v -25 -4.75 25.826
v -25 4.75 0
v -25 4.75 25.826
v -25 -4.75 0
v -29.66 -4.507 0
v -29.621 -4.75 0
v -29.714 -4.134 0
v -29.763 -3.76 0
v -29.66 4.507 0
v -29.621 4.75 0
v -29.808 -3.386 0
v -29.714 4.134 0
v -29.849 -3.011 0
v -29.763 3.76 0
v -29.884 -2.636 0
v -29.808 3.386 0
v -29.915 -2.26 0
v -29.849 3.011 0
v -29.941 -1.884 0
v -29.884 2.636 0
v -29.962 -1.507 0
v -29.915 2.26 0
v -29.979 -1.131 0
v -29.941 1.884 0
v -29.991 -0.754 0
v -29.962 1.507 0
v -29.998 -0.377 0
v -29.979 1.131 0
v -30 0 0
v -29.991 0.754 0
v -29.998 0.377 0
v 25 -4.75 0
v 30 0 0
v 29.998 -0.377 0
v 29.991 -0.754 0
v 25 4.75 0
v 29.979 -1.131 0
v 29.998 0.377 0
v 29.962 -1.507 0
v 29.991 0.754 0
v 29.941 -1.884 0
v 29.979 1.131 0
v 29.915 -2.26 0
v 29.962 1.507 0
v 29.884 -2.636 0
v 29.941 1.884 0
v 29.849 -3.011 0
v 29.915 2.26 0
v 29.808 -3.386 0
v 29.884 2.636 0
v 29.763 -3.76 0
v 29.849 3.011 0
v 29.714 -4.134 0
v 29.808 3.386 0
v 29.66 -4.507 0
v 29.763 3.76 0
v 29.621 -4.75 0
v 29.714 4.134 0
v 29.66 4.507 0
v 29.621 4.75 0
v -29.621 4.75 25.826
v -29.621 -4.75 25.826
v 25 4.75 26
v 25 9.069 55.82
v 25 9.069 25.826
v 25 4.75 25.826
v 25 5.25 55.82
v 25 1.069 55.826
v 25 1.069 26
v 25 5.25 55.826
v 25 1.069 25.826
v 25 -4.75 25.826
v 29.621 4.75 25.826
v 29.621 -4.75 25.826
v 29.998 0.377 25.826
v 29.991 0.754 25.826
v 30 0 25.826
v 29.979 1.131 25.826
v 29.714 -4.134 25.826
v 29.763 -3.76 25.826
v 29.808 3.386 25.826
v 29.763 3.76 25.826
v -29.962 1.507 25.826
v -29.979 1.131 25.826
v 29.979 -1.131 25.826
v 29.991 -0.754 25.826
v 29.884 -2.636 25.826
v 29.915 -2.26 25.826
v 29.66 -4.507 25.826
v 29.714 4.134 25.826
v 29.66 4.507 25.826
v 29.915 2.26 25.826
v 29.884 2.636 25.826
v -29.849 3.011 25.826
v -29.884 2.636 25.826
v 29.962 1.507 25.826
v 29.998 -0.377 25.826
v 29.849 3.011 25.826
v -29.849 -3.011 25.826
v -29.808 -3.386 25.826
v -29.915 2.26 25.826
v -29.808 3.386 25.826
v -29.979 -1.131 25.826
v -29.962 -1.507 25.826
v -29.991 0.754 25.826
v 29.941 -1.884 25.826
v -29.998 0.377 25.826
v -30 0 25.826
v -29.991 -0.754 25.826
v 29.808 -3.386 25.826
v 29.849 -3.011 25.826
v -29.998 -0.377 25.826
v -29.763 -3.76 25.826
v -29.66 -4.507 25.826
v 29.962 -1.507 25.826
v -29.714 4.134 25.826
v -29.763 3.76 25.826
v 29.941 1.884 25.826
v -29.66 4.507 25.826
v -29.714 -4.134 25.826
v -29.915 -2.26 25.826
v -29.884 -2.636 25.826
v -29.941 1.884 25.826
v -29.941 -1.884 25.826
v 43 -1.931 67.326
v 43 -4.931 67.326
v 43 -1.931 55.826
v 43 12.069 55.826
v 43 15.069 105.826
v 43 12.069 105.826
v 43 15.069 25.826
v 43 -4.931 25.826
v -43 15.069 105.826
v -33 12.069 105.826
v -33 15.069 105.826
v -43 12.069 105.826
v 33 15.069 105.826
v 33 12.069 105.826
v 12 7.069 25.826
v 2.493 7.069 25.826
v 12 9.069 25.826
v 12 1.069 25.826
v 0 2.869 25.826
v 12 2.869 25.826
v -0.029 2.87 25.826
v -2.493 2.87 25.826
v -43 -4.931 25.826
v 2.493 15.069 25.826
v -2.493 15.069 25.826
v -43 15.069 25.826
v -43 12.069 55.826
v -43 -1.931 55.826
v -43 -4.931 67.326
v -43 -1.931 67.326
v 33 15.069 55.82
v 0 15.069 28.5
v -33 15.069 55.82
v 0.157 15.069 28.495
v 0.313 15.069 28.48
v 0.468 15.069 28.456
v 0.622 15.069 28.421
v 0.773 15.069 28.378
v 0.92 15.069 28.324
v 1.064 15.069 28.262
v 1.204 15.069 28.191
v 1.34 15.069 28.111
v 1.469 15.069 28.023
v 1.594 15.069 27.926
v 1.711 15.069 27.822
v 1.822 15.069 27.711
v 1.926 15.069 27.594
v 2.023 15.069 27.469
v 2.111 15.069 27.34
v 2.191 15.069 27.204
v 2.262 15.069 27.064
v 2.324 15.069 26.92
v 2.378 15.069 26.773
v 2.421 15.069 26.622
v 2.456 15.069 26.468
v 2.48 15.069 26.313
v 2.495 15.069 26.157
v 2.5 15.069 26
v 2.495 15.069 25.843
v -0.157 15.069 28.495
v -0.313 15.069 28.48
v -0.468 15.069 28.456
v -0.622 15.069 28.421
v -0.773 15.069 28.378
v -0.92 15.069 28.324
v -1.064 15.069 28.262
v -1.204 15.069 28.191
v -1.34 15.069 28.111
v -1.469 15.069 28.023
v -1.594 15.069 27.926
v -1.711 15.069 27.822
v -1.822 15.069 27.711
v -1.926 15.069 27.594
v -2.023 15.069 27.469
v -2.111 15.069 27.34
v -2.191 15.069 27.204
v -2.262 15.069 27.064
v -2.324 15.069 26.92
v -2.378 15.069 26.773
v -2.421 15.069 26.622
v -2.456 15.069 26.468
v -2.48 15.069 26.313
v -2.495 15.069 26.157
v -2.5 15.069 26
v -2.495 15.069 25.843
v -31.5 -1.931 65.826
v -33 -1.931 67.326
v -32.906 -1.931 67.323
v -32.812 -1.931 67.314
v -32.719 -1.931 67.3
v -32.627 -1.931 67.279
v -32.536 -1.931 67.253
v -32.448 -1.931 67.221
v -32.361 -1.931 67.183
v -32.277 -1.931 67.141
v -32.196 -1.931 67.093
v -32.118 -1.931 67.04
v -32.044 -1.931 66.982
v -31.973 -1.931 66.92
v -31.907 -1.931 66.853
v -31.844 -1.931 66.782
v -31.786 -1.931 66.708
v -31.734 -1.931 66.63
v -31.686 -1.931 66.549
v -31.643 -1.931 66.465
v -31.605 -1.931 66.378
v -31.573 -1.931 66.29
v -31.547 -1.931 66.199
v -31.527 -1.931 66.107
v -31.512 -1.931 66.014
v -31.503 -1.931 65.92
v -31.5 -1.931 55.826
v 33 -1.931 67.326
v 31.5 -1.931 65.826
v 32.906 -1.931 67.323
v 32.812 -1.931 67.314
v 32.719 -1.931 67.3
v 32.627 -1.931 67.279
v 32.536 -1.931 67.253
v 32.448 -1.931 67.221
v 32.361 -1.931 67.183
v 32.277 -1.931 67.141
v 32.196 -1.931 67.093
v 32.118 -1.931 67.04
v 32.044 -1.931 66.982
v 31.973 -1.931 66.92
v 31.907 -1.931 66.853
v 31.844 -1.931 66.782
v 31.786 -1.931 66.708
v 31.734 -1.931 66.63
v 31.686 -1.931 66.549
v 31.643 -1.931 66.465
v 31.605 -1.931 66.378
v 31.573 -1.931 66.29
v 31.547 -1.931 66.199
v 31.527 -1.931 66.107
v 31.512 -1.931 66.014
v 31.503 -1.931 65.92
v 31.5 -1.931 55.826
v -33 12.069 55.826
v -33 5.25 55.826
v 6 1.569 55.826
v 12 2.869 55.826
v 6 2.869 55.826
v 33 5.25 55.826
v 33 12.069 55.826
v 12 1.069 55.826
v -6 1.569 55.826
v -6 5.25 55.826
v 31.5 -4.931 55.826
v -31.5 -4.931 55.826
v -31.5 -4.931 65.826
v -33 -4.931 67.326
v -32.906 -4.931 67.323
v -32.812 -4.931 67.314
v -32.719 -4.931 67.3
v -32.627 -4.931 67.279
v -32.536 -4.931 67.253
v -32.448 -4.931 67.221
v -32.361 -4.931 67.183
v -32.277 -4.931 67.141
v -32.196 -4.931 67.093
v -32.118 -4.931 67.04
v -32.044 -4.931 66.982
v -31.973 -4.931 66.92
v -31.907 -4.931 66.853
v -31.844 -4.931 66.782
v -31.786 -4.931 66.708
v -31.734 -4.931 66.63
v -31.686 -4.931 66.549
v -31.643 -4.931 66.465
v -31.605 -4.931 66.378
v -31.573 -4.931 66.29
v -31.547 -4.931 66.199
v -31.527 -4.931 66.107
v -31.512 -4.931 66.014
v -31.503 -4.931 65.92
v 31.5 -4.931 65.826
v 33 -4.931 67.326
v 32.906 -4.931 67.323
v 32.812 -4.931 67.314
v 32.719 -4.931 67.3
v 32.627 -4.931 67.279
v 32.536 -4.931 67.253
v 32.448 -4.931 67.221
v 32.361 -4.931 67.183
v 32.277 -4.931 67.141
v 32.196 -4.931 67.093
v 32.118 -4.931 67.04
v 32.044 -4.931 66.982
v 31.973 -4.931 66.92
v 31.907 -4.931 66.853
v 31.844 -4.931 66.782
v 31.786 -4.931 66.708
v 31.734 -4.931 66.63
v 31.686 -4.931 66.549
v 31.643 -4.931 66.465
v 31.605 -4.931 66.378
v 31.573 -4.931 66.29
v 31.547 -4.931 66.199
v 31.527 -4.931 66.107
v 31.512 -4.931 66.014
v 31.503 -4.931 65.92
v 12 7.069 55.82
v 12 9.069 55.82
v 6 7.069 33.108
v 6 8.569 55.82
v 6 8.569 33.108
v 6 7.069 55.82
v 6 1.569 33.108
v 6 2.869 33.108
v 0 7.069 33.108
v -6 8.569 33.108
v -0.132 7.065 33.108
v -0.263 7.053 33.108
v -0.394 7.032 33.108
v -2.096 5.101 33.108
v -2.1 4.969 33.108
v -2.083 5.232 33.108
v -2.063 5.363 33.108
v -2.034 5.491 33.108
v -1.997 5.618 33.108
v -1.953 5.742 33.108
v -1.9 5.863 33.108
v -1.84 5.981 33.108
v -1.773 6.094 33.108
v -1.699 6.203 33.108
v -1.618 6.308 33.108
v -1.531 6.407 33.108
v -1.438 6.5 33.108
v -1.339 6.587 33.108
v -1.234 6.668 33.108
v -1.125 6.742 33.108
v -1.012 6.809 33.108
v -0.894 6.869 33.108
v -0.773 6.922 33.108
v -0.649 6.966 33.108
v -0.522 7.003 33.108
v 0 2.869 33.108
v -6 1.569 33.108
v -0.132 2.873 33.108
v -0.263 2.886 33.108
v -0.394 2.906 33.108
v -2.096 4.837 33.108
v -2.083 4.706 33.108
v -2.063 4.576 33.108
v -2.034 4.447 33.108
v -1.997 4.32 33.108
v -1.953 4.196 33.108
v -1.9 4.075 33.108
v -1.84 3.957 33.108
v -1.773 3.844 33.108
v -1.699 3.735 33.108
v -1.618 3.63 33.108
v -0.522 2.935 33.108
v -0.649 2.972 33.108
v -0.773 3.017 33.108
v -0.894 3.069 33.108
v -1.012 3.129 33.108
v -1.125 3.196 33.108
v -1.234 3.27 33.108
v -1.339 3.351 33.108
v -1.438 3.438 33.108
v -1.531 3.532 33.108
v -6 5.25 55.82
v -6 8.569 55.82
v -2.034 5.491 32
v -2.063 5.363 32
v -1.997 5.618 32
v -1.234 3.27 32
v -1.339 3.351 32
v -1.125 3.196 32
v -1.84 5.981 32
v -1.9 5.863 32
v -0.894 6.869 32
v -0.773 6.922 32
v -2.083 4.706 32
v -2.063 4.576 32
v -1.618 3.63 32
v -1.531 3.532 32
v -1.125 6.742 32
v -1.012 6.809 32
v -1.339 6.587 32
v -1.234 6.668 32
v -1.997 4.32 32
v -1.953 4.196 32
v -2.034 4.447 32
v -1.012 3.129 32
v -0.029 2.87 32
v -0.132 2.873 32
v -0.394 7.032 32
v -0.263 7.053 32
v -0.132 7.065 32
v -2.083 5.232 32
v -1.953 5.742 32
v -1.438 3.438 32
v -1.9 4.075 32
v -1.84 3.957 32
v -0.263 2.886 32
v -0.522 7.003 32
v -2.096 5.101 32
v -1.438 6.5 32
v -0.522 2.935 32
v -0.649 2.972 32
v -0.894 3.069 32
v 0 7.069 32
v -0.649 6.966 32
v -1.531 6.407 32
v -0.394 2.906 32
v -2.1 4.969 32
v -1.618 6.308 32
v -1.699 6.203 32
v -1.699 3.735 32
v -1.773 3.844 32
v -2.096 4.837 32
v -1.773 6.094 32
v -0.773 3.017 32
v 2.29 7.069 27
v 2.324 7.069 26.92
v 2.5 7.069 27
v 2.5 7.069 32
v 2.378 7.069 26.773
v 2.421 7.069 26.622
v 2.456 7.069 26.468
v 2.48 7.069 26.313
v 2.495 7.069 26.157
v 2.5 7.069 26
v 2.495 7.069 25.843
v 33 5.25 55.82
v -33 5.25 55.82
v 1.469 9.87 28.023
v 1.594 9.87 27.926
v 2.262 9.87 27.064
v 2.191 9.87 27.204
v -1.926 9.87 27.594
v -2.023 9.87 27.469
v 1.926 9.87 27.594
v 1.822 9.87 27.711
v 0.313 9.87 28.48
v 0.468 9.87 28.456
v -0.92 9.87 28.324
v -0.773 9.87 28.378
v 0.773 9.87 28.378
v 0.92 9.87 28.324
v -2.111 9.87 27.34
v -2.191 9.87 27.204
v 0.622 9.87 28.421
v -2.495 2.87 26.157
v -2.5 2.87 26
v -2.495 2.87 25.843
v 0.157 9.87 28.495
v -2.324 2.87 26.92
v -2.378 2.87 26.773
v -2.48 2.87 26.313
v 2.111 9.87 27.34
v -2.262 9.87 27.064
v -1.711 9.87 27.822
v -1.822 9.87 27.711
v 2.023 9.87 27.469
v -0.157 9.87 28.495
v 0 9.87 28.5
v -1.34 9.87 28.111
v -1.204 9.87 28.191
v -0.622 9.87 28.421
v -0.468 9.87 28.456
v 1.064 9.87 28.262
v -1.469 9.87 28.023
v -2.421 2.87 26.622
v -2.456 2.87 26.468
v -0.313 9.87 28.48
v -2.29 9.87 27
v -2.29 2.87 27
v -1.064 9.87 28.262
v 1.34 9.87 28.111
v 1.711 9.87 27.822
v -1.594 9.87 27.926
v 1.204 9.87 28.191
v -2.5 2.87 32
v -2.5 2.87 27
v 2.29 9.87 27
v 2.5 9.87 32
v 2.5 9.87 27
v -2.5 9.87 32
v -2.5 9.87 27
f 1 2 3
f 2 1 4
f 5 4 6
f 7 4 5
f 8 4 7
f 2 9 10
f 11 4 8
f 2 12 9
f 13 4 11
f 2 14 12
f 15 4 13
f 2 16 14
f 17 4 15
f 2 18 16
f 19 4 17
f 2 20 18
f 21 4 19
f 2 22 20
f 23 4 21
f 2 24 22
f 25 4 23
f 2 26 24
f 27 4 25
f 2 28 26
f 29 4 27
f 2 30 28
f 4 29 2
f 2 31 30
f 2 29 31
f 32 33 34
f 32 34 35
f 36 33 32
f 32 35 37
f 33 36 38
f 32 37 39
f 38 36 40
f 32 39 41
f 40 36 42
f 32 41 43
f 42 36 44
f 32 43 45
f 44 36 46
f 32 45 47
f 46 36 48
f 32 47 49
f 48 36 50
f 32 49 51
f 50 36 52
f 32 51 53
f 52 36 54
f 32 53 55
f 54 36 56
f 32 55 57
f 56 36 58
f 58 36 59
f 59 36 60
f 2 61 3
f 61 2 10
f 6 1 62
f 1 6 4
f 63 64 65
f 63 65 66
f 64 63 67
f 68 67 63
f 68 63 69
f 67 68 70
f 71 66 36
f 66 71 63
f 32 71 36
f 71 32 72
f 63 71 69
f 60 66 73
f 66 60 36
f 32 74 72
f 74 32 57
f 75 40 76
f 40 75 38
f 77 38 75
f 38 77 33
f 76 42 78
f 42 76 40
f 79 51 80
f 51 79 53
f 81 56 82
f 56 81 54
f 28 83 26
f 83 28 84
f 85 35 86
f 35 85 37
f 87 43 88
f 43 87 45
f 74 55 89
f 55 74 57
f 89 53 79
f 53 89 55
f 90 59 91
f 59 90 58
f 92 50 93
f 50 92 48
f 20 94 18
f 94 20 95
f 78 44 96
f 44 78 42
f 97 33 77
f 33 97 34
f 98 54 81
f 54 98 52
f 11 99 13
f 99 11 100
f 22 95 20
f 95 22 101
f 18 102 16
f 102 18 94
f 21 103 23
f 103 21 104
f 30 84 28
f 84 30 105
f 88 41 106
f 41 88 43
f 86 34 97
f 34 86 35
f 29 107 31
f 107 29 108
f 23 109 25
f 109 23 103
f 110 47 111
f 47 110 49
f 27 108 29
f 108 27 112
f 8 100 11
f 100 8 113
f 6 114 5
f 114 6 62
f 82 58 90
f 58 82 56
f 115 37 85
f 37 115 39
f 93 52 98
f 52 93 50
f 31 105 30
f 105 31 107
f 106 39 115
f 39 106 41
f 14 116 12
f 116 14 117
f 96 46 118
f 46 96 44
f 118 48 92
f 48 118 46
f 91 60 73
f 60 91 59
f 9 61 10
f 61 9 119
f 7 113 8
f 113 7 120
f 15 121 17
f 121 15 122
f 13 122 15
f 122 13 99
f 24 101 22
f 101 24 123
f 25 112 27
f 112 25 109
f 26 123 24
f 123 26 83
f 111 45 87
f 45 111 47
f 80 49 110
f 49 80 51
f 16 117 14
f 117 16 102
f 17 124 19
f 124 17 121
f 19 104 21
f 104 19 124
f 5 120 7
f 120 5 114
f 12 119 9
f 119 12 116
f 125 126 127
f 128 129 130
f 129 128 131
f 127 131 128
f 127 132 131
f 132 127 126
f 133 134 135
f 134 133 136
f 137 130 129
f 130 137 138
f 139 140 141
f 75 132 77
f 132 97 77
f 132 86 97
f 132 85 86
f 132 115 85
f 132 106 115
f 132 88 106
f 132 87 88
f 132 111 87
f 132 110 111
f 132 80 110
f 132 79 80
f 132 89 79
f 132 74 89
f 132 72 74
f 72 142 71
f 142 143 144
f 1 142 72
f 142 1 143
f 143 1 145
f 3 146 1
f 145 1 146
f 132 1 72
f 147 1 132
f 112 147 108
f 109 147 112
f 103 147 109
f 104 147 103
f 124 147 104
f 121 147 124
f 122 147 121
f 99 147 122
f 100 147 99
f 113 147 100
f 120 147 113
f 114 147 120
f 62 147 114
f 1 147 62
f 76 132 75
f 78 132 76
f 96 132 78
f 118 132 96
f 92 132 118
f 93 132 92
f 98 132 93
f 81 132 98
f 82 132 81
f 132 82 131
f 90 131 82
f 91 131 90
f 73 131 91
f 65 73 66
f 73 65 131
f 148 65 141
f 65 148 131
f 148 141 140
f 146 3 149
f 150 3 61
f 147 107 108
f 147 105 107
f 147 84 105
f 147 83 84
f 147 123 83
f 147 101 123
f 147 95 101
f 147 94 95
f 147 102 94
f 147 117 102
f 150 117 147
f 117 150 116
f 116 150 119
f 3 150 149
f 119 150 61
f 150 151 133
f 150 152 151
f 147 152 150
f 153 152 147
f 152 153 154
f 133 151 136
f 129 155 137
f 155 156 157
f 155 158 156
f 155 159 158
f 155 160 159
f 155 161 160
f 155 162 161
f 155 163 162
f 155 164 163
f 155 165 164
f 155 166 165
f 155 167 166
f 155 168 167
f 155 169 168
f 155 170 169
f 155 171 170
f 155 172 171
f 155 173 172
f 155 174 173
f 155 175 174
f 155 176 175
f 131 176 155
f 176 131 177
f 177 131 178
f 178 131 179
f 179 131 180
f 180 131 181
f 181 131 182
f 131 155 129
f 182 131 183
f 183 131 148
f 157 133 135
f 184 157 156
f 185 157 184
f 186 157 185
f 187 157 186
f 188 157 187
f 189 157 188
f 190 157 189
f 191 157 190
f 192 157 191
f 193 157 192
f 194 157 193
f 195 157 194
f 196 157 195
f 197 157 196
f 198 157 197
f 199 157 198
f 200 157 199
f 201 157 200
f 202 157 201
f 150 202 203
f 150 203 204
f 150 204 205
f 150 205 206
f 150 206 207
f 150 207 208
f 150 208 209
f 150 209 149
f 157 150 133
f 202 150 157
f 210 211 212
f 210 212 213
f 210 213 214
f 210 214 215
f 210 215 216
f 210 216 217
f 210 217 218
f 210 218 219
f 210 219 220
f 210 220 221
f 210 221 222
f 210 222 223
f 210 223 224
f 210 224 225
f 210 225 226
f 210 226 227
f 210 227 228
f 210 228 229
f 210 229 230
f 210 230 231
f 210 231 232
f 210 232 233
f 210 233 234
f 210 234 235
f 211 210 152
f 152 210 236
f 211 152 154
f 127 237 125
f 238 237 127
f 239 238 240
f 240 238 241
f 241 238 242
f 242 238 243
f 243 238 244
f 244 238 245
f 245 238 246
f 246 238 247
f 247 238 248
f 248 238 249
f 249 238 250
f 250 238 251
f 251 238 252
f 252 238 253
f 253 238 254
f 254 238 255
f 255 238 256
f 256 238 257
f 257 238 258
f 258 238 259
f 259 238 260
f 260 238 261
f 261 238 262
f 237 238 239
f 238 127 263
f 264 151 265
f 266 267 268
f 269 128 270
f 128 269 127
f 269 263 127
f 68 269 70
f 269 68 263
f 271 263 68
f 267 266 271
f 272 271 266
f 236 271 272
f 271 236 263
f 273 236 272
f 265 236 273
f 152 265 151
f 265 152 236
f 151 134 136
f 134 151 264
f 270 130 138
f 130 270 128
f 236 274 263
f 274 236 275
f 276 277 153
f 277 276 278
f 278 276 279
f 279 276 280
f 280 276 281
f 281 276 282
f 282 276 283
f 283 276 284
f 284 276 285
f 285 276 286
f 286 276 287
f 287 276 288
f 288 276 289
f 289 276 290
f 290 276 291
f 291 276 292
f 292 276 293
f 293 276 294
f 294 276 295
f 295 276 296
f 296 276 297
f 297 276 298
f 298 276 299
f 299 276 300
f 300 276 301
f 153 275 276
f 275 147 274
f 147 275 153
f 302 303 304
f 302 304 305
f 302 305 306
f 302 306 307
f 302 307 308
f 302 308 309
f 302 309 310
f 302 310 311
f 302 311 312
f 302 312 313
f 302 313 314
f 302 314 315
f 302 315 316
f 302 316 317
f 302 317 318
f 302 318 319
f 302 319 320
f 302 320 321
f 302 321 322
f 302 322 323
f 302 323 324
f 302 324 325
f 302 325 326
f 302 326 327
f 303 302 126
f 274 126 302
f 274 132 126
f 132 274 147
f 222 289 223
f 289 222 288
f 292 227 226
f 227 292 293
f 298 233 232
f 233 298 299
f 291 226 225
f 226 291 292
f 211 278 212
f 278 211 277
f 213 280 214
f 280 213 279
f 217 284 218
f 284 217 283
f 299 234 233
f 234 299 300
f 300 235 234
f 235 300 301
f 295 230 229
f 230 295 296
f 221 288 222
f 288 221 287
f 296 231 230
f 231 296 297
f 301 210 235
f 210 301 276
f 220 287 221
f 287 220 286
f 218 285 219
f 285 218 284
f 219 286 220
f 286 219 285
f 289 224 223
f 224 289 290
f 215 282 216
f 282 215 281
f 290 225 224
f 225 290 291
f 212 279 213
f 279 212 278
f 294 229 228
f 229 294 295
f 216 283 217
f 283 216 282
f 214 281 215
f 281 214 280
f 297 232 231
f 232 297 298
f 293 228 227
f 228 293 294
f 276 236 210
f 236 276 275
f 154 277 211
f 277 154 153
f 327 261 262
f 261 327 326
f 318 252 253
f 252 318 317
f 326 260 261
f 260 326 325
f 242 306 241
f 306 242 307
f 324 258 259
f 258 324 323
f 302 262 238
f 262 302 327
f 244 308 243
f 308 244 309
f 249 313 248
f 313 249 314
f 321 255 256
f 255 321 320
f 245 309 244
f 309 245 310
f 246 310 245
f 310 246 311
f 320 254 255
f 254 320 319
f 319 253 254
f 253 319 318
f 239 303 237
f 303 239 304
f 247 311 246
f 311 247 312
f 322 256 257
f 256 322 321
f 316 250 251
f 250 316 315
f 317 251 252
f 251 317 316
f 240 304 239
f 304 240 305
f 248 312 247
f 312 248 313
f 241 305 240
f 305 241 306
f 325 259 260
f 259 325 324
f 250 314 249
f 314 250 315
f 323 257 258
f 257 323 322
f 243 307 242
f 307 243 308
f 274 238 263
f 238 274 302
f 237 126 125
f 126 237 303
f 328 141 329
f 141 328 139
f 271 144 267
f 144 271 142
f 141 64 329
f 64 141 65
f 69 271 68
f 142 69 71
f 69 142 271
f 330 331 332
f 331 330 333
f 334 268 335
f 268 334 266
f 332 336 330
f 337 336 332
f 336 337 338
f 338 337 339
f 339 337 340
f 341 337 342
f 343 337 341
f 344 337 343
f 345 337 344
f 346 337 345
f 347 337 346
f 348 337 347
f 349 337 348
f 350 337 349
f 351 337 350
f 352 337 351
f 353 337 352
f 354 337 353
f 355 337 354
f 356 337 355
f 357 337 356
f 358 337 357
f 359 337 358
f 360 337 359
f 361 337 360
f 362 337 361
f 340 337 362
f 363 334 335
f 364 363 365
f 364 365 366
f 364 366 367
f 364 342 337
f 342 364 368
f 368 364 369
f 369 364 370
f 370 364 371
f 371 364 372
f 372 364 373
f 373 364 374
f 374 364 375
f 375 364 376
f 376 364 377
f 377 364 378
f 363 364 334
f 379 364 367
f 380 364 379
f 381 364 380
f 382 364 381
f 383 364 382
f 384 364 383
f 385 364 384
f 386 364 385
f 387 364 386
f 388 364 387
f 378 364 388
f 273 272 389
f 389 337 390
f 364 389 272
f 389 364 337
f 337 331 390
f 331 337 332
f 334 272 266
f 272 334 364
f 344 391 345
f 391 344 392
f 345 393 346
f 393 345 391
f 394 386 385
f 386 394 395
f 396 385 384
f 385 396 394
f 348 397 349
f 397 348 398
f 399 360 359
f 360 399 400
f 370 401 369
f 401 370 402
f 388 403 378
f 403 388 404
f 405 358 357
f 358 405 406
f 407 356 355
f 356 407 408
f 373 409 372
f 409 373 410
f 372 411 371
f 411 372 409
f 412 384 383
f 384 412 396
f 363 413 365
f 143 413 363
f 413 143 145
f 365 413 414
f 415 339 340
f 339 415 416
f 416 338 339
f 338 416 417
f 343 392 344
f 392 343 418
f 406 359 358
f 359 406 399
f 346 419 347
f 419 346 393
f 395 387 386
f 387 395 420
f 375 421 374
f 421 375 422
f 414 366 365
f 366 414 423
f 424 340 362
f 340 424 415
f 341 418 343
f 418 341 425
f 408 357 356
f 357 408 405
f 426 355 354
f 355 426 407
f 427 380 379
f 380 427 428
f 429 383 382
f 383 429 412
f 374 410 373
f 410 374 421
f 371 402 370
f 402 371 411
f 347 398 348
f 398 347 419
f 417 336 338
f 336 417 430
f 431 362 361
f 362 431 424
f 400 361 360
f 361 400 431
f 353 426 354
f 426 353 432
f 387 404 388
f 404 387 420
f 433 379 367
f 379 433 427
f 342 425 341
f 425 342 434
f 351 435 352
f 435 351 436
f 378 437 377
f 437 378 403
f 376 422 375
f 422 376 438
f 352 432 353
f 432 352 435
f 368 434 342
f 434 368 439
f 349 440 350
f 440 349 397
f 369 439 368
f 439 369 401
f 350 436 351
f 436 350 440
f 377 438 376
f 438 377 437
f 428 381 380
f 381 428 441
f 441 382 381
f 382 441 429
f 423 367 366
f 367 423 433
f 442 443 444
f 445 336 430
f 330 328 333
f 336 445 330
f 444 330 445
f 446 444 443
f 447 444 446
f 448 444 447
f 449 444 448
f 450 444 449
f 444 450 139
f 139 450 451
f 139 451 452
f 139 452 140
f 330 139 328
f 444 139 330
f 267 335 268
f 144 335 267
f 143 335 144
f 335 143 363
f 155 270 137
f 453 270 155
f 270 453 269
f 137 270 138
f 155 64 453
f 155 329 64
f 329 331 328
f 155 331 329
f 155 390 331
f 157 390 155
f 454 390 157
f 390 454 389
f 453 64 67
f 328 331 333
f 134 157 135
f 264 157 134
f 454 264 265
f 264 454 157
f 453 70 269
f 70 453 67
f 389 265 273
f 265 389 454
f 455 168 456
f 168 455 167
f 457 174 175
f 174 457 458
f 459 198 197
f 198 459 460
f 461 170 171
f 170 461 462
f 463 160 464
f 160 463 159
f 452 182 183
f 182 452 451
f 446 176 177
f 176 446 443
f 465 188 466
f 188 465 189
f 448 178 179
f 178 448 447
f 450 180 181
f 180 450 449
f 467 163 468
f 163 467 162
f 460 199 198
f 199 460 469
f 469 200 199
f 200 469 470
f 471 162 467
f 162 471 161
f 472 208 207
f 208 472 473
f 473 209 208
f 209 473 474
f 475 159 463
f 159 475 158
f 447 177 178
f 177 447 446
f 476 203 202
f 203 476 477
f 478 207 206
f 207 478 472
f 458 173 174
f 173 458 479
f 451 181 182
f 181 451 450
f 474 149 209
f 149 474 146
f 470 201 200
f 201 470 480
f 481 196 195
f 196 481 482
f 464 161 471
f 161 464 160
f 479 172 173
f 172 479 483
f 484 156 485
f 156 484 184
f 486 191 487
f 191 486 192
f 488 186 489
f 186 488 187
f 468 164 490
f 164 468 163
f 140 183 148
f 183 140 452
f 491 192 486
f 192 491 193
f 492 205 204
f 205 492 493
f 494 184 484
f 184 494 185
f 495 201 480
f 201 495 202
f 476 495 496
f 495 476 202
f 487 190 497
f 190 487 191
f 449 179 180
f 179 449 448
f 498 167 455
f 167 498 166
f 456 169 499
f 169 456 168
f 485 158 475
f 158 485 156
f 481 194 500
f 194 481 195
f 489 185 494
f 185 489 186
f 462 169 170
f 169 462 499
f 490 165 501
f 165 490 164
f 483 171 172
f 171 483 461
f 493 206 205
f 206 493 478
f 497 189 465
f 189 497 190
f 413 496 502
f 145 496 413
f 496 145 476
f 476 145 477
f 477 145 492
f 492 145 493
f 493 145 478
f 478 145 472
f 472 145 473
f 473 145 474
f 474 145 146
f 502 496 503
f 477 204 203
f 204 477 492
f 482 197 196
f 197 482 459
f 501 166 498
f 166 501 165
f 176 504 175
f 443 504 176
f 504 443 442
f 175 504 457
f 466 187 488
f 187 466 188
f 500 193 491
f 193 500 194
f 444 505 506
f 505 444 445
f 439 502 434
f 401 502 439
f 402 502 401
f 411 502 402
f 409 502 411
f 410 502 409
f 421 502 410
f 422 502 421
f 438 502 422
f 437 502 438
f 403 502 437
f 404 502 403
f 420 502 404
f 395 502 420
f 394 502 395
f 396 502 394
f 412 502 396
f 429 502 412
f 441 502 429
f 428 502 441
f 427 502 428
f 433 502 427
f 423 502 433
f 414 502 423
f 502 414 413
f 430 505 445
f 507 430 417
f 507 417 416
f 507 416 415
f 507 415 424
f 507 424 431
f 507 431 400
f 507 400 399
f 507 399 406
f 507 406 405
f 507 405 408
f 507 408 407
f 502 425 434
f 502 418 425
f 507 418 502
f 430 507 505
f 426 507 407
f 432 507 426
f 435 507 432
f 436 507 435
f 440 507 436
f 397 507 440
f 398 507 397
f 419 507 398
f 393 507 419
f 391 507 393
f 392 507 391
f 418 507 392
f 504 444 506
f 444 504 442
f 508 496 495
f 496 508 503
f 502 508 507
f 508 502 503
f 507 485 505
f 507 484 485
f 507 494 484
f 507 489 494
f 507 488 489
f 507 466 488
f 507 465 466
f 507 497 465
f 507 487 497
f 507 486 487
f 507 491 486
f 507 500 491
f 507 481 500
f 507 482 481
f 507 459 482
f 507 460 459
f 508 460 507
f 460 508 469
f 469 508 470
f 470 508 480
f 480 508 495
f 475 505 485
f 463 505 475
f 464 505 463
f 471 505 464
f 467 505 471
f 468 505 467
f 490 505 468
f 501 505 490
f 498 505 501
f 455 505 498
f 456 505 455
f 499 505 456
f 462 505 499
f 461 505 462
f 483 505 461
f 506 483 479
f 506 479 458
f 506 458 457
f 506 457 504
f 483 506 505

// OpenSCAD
// file: params.scad
d_cup_holder = 60;
h_cup_holder = 25;

x_support = 5;
y_support = 10;

x_usb = 12;
y_usb = 7;
z_usb = 20;
// main file
include <params.scad>;

union()
{
    intersection()
    {
        union()
        {
            translate([d_cup_holder / -2, (y_support - 0.5) / -2, 0])
            {
                cube([x_support, y_support - 0.5, h_cup_holder + 1]);
            }

            translate([d_cup_holder / 2 - x_support, (y_support - 0.5) / -2, 0])
            {
                cube([x_support, y_support - 0.5, h_cup_holder + 1]);
            }
        }

        cylinder(h=h_cup_holder + 1, d=d_cup_holder, $fn=500);

    }

    // From https://github.com/mioux/pixel_6-stand
    // I don't want to rewrite all :D
    translate([-43, (y_support - 0.5) / -2, 20])
    {
        difference()
        {
            union()
            {
                translate([0, 3 * cos(20), 6.2 * cos(20)])
                {
                    // Main support

                    union()
                    {
                        // Phone holder

                        difference()
                        {
                            cube([86, 17, 80]);
                            translate([-1, -1, 30])
                            {
                                cube([90, 15, 60]);
                            }
                        }

                        // Front plate
                        translate([0, -3, 0])
                        {
                            union()
                            {
                                cube([86, 3, 30]);

                                translate([0, 0, 30]) cube([10, 3, 10]);

                                translate([76, 0, 30]) cube([10, 3, 10]);

                                // Right suppport lock
                                translate([10, 0, 40])
                                rotate([-90, 0, 0]) cylinder(h=3, d=3, center=false, $fn=100);

                                translate([8.5, 0, 0]) cube([3, 3, 40]);

                                translate([0, 0, 40]) cube([10, 3, 1.5]);

                                // Right suppport lock
                                translate([76, 0, 40])
                                rotate([-90, 0, 0]) cylinder(h=3, d=3, center=false, $fn=100);

                                translate([74.5, 0, 0]) cube([3, 3, 40]);

                                translate([76, 0, 40]) cube([10, 3, 1.5]);
                            }
                        }

                    }
                }
            }

            translate([0, 3 * cos(20), 6.5 * cos(20)])
            {
                union()
                {
                    translate([55, 3, -21]) cube([13, 8, 65]);
                    translate([37, 3.5, 7]) cube([12, 7, 30]);
                    translate([43, 6.9, -21]) cylinder(d=4.2, h=65, $fn=100);
                    translate([43, 4.8, -21]) cube([20, 4.2, 65]);
                }
            }

            translate([10,10,35.82])
            {
                cube([66, 10, 400]);
            }

            translate([43,7.62,6])
                rotate([-90, 0, 0])
                    cylinder(d=5,h=100,$fn=100);


            translate([40.5, 7.62, 7])
                cube([5,7,5]);
        }
    }
}
